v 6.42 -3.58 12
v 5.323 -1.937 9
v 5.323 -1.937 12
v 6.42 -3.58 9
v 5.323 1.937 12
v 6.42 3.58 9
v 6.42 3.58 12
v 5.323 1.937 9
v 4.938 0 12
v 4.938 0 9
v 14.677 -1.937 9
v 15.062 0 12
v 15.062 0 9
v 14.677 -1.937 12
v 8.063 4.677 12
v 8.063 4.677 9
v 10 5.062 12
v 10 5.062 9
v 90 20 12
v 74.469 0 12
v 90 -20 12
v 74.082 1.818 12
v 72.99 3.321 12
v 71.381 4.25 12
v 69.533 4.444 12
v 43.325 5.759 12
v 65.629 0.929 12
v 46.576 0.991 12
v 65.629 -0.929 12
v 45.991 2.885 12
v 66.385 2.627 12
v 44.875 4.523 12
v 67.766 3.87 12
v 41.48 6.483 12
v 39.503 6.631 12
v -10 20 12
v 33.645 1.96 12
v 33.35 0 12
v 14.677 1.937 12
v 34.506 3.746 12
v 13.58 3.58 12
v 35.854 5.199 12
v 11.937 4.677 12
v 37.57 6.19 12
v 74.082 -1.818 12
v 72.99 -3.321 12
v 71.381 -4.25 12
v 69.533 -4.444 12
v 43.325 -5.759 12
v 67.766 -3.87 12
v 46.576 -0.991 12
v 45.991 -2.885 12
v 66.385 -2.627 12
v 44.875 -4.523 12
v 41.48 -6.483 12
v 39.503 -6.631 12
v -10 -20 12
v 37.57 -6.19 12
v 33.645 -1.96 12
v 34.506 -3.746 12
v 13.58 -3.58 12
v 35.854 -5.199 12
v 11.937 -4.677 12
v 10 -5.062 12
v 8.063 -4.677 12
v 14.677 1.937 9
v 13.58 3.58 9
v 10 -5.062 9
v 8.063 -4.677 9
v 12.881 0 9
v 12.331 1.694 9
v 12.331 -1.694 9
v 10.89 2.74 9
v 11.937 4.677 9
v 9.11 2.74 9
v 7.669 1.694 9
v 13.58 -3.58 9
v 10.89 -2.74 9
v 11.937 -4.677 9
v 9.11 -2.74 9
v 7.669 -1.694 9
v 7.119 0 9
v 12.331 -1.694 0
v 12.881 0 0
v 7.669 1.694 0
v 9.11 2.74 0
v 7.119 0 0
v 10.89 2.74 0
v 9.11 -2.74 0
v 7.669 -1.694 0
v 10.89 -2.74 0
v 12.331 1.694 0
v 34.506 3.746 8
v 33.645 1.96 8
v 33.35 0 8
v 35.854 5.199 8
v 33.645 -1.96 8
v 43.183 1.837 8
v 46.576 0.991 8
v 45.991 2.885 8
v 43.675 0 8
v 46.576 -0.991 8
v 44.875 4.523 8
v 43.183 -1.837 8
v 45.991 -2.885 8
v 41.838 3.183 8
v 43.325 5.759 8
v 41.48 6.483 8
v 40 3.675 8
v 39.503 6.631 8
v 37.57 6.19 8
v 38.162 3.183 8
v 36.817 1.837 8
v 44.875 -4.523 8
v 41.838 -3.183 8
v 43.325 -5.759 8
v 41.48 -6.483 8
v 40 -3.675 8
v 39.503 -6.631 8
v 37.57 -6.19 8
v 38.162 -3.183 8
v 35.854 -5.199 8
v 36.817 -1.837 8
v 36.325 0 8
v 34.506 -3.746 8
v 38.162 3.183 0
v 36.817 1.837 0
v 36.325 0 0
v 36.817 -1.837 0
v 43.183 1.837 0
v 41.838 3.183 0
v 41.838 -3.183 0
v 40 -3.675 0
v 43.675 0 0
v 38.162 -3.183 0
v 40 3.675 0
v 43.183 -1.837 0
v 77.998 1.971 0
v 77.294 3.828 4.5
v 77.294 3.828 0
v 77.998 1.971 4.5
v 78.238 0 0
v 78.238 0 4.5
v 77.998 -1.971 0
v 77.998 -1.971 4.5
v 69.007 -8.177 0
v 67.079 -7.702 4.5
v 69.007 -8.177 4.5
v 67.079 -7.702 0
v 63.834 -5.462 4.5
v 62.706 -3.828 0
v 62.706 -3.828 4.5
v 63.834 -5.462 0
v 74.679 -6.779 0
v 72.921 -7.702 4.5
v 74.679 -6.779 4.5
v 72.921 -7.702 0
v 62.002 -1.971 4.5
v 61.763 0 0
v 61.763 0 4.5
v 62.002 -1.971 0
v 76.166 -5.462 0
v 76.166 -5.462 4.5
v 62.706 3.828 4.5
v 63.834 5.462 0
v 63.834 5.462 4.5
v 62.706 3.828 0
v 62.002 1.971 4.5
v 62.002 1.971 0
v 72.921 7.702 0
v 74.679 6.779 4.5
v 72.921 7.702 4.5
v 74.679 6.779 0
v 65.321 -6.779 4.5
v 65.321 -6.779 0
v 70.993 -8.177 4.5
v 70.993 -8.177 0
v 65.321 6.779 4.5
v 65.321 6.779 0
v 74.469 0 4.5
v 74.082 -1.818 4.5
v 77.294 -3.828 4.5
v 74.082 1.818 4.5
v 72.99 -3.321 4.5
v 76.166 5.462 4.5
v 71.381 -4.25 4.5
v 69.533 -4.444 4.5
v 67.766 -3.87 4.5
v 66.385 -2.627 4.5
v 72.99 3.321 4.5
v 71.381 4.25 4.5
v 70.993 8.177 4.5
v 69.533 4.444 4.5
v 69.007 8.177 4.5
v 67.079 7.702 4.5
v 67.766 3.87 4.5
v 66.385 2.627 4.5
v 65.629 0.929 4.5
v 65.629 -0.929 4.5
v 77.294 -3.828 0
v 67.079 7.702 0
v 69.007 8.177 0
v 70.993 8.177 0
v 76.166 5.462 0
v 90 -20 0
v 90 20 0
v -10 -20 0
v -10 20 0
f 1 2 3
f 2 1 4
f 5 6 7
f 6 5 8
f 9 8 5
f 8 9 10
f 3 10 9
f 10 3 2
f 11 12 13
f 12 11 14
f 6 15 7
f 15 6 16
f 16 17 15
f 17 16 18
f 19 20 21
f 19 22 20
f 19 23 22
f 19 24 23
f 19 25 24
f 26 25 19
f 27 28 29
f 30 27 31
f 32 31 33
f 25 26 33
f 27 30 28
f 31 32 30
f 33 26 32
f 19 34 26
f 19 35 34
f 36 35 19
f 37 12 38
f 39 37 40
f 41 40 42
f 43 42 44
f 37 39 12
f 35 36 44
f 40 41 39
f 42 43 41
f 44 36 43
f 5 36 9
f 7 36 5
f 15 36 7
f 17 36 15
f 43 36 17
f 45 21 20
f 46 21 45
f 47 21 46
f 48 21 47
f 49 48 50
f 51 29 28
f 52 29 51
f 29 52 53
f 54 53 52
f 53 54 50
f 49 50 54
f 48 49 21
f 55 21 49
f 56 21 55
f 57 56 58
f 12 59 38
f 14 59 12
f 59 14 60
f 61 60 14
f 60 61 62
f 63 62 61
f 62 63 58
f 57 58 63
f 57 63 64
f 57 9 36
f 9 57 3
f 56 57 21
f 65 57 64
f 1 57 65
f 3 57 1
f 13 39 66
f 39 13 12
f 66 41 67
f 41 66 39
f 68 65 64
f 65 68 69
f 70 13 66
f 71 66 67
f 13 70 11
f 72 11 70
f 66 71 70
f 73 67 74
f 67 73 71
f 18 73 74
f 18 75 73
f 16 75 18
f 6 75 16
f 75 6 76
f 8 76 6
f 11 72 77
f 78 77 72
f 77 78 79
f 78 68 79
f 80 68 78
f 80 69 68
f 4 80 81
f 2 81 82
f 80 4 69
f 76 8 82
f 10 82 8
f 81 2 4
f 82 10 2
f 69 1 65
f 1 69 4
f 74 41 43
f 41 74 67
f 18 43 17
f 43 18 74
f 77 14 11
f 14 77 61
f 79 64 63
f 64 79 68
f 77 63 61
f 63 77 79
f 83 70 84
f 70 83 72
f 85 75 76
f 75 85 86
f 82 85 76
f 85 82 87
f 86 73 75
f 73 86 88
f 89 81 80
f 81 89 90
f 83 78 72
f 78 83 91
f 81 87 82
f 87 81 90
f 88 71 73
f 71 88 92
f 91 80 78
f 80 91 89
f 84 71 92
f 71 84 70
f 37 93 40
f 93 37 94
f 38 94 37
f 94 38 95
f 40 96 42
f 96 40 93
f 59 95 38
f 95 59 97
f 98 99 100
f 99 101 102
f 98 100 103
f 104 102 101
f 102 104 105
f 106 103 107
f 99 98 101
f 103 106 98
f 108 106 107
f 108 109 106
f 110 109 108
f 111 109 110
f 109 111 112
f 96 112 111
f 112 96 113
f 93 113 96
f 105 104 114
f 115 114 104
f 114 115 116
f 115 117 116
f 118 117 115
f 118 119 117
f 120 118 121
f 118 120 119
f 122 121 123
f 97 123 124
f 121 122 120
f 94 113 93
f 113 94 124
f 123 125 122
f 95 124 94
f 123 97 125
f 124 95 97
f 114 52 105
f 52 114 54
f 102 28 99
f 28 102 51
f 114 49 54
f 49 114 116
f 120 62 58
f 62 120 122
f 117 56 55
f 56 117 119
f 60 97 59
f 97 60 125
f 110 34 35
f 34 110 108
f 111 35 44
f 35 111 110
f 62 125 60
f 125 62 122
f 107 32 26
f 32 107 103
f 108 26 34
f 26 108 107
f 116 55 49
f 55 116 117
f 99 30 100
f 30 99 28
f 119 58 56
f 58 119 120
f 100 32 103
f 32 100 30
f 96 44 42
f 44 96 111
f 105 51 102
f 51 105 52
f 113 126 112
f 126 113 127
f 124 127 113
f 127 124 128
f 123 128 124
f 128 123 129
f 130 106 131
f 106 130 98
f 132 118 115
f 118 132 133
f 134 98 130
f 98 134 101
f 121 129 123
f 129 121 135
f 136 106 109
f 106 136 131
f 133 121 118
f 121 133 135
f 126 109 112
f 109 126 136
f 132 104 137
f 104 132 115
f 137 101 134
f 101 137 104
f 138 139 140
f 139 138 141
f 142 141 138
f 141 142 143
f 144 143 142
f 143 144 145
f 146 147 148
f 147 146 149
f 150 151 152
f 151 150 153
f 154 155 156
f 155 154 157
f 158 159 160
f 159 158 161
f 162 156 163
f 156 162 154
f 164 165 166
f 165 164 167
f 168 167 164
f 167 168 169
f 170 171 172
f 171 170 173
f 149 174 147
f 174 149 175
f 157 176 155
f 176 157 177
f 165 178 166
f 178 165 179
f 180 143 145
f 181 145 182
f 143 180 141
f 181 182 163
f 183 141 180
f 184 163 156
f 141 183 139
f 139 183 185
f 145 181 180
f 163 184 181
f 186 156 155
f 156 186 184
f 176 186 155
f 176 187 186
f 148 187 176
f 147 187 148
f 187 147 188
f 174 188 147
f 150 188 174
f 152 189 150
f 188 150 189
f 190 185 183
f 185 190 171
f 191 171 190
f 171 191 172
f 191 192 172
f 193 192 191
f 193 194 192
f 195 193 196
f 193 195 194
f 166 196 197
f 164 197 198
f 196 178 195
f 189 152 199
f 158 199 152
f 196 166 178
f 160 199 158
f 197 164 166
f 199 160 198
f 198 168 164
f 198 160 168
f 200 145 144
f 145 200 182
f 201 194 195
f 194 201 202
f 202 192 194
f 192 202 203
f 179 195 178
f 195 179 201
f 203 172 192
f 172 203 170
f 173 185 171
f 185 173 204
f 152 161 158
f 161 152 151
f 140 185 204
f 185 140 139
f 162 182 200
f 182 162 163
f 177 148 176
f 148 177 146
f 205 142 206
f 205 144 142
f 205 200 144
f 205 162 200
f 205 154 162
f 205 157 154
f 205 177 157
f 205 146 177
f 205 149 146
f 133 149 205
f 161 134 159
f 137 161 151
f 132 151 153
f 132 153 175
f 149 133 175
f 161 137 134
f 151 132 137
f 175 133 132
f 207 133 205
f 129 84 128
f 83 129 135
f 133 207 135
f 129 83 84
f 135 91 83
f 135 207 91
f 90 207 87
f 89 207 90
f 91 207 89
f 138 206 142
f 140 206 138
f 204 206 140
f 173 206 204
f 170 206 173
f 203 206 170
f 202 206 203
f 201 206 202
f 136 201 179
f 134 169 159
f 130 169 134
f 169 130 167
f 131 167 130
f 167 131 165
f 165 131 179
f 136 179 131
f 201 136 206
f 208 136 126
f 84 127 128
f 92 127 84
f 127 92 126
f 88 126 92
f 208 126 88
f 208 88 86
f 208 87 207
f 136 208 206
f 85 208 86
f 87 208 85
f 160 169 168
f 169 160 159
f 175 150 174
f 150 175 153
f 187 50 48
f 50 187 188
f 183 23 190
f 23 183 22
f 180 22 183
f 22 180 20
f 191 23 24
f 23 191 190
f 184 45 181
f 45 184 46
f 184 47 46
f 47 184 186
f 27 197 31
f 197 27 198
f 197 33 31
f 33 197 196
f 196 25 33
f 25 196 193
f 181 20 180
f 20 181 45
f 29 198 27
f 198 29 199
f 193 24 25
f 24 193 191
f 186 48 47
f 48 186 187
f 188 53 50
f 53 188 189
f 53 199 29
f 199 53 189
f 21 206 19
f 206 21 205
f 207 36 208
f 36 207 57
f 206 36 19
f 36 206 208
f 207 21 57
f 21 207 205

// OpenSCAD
// =====================================================
// CALCULADORA DE AVELLANADO - TORNILLOS WHITWORTH (BSW)
// El diámetro de rosca se ingresa en PULGADAS (decimal)
// Ej: 1/4" = 0.25 , 3/8" = 0.375 , 1/2" = 0.5
// Versión cilindro recto - DEMO 3D
// =====================================================

PULGADA = 25.4; // mm por pulgada

// Convierte pulgadas a mm
function pulg_a_mm(p) = p * PULGADA;

// Tabla de diámetros nominales Whitworth más comunes (en pulgadas)
// junto a su equivalente en mm, para referencia:
// 1/8"  = 3.175 mm      5/16" = 7.938 mm      5/8" = 15.875 mm
// 3/16" = 4.763 mm      3/8"  = 9.525 mm      3/4" = 19.050 mm
// 1/4"  = 6.350 mm      7/16" = 11.113 mm     7/8" = 22.225 mm
// 5/16" = 7.938 mm      1/2"  = 12.700 mm     1"   = 25.400 mm

// Función que calcula [DK, K] en mm según el diámetro de rosca
// D_pulg: diámetro nominal en pulgadas (ej: 0.25 para 1/4")
// NOTA: al no existir una norma DIN/ISO de cabeza avellanada para
// Whitworth, se usa la regla práctica DK≈2*D, K≈0.6*D.
// Ajustar si contás con la tabla real del fabricante.
function cabeza_tornillo_whitworth(D_pulg) =
    let(D = pulg_a_mm(D_pulg))
    [D * 2.0, D * 0.6];

// =====================================================
// MÓDULO: AVELLANADO PARA TORNILLO WHITWORTH
// =====================================================
module avellanado_cilindrico_whitworth(
    diametro_rosca_pulg,      // Diámetro del tornillo en PULGADAS
    profundidad_avellano,     // Profundidad del avellanado en mm
    holgura = 0.3             // Holgura para el diámetro en mm
) {
    datos = cabeza_tornillo_whitworth(diametro_rosca_pulg);
    diametro_cabeza = datos[0];

    translate([0, 0, 0])
        cylinder(h = profundidad_avellano,
                 r = (diametro_cabeza/2) + holgura);
}

// =====================================================
// MÓDULO: AGUJERO PASANTE PARA TORNILLO WHITWORTH
// =====================================================
module agujero_pasante_whitworth(
    diametro_rosca_pulg,       // Diámetro del tornillo en PULGADAS
    profundidad,                // Profundidad total del agujero
    profundidad_avellano = 0,   // Suma del hueco de avellanado
    holgura = 0.5,               // Holgura para el diámetro en mm
    profundidad_abs = true
) {
    diametro_rosca_mm = pulg_a_mm(diametro_rosca_pulg);

    if (profundidad_abs)
        translate([0, 0, profundidad_avellano])
            cylinder(h = profundidad - profundidad_avellano,
                     r = (diametro_rosca_mm/2) + holgura);
    else
        translate([0, 0, profundidad_avellano])
            cylinder(h = profundidad,
                     r = (diametro_rosca_mm/2) + holgura);
}

// =====================================================
// MÓDULO COMBINADO - AVELLANADO + AGUJERO (WHITWORTH)
// =====================================================
module agujero_con_avellanado_whitworth(
    diametro_rosca_pulg,        // Diámetro del tornillo en PULGADAS
    profundidad_avellano,       // Profundidad del avellanado en mm
    profundidad_pieza,          // Grosor total de la pieza en mm
    holgura_avellano = 0.3,
    holgura_pasante = 0.5,
    profundidad_abs = true
) {
    avellanado_cilindrico_whitworth(
        diametro_rosca_pulg = diametro_rosca_pulg,
        profundidad_avellano = profundidad_avellano,
        holgura = holgura_avellano
    );

    agujero_pasante_whitworth(
        diametro_rosca_pulg = diametro_rosca_pulg,
        profundidad = profundidad_pieza,
        profundidad_avellano = profundidad_avellano,
        holgura = holgura_pasante,
        profundidad_abs = profundidad_abs
    );
}

// Funciones de utilidad
function diametro_cabeza_whitworth(D_pulg) = cabeza_tornillo_whitworth(D_pulg)[0];
function altura_cabeza_whitworth(D_pulg) = cabeza_tornillo_whitworth(D_pulg)[1];

// =====================================================
// DEMO 3D: placa con 3 avellanados de distinto diámetro
// margen de corte para evitar z-fighting en el booleano
// =====================================================
margen_corte_wh = 0.5;
espesor_placa_wh = 12;   // mm - grosor de la placa demo
ancho_placa_wh   = 100;
largo_placa_wh   = 40;

module placa_demo_whitworth() {
    difference() {
        // Placa base
        translate([-10, -largo_placa_wh/2, 0])
            cube([ancho_placa_wh, largo_placa_wh, espesor_placa_wh]);

        // Tornillo Whitworth 3/16", entra por la cara superior
        translate([10, 0, espesor_placa_wh])
            rotate([0, 180, 0])
                agujero_con_avellanado_whitworth(
                    diametro_rosca_pulg = 3/16,
                    profundidad_avellano = 3.0,
                    profundidad_pieza = espesor_placa_wh + margen_corte_wh
                );

        // Tornillo Whitworth 1/4", entra por la cara superior
        translate([40, 0, espesor_placa_wh])
            rotate([0, 180, 0])
                agujero_con_avellanado_whitworth(
                    diametro_rosca_pulg = 1/4,
                    profundidad_avellano = 4.0,
                    profundidad_pieza = espesor_placa_wh + margen_corte_wh
                );

        // Tornillo Whitworth 5/16", entra por la cara inferior
        // (demuestra profundidad_abs = false)
        translate([70, 0, 0])
            agujero_con_avellanado_whitworth(
                diametro_rosca_pulg = 5/16,
                profundidad_avellano = 4.5,
                profundidad_pieza = espesor_placa_wh + margen_corte_wh,
                profundidad_abs = false
            );
    }
}

placa_demo_whitworth();
